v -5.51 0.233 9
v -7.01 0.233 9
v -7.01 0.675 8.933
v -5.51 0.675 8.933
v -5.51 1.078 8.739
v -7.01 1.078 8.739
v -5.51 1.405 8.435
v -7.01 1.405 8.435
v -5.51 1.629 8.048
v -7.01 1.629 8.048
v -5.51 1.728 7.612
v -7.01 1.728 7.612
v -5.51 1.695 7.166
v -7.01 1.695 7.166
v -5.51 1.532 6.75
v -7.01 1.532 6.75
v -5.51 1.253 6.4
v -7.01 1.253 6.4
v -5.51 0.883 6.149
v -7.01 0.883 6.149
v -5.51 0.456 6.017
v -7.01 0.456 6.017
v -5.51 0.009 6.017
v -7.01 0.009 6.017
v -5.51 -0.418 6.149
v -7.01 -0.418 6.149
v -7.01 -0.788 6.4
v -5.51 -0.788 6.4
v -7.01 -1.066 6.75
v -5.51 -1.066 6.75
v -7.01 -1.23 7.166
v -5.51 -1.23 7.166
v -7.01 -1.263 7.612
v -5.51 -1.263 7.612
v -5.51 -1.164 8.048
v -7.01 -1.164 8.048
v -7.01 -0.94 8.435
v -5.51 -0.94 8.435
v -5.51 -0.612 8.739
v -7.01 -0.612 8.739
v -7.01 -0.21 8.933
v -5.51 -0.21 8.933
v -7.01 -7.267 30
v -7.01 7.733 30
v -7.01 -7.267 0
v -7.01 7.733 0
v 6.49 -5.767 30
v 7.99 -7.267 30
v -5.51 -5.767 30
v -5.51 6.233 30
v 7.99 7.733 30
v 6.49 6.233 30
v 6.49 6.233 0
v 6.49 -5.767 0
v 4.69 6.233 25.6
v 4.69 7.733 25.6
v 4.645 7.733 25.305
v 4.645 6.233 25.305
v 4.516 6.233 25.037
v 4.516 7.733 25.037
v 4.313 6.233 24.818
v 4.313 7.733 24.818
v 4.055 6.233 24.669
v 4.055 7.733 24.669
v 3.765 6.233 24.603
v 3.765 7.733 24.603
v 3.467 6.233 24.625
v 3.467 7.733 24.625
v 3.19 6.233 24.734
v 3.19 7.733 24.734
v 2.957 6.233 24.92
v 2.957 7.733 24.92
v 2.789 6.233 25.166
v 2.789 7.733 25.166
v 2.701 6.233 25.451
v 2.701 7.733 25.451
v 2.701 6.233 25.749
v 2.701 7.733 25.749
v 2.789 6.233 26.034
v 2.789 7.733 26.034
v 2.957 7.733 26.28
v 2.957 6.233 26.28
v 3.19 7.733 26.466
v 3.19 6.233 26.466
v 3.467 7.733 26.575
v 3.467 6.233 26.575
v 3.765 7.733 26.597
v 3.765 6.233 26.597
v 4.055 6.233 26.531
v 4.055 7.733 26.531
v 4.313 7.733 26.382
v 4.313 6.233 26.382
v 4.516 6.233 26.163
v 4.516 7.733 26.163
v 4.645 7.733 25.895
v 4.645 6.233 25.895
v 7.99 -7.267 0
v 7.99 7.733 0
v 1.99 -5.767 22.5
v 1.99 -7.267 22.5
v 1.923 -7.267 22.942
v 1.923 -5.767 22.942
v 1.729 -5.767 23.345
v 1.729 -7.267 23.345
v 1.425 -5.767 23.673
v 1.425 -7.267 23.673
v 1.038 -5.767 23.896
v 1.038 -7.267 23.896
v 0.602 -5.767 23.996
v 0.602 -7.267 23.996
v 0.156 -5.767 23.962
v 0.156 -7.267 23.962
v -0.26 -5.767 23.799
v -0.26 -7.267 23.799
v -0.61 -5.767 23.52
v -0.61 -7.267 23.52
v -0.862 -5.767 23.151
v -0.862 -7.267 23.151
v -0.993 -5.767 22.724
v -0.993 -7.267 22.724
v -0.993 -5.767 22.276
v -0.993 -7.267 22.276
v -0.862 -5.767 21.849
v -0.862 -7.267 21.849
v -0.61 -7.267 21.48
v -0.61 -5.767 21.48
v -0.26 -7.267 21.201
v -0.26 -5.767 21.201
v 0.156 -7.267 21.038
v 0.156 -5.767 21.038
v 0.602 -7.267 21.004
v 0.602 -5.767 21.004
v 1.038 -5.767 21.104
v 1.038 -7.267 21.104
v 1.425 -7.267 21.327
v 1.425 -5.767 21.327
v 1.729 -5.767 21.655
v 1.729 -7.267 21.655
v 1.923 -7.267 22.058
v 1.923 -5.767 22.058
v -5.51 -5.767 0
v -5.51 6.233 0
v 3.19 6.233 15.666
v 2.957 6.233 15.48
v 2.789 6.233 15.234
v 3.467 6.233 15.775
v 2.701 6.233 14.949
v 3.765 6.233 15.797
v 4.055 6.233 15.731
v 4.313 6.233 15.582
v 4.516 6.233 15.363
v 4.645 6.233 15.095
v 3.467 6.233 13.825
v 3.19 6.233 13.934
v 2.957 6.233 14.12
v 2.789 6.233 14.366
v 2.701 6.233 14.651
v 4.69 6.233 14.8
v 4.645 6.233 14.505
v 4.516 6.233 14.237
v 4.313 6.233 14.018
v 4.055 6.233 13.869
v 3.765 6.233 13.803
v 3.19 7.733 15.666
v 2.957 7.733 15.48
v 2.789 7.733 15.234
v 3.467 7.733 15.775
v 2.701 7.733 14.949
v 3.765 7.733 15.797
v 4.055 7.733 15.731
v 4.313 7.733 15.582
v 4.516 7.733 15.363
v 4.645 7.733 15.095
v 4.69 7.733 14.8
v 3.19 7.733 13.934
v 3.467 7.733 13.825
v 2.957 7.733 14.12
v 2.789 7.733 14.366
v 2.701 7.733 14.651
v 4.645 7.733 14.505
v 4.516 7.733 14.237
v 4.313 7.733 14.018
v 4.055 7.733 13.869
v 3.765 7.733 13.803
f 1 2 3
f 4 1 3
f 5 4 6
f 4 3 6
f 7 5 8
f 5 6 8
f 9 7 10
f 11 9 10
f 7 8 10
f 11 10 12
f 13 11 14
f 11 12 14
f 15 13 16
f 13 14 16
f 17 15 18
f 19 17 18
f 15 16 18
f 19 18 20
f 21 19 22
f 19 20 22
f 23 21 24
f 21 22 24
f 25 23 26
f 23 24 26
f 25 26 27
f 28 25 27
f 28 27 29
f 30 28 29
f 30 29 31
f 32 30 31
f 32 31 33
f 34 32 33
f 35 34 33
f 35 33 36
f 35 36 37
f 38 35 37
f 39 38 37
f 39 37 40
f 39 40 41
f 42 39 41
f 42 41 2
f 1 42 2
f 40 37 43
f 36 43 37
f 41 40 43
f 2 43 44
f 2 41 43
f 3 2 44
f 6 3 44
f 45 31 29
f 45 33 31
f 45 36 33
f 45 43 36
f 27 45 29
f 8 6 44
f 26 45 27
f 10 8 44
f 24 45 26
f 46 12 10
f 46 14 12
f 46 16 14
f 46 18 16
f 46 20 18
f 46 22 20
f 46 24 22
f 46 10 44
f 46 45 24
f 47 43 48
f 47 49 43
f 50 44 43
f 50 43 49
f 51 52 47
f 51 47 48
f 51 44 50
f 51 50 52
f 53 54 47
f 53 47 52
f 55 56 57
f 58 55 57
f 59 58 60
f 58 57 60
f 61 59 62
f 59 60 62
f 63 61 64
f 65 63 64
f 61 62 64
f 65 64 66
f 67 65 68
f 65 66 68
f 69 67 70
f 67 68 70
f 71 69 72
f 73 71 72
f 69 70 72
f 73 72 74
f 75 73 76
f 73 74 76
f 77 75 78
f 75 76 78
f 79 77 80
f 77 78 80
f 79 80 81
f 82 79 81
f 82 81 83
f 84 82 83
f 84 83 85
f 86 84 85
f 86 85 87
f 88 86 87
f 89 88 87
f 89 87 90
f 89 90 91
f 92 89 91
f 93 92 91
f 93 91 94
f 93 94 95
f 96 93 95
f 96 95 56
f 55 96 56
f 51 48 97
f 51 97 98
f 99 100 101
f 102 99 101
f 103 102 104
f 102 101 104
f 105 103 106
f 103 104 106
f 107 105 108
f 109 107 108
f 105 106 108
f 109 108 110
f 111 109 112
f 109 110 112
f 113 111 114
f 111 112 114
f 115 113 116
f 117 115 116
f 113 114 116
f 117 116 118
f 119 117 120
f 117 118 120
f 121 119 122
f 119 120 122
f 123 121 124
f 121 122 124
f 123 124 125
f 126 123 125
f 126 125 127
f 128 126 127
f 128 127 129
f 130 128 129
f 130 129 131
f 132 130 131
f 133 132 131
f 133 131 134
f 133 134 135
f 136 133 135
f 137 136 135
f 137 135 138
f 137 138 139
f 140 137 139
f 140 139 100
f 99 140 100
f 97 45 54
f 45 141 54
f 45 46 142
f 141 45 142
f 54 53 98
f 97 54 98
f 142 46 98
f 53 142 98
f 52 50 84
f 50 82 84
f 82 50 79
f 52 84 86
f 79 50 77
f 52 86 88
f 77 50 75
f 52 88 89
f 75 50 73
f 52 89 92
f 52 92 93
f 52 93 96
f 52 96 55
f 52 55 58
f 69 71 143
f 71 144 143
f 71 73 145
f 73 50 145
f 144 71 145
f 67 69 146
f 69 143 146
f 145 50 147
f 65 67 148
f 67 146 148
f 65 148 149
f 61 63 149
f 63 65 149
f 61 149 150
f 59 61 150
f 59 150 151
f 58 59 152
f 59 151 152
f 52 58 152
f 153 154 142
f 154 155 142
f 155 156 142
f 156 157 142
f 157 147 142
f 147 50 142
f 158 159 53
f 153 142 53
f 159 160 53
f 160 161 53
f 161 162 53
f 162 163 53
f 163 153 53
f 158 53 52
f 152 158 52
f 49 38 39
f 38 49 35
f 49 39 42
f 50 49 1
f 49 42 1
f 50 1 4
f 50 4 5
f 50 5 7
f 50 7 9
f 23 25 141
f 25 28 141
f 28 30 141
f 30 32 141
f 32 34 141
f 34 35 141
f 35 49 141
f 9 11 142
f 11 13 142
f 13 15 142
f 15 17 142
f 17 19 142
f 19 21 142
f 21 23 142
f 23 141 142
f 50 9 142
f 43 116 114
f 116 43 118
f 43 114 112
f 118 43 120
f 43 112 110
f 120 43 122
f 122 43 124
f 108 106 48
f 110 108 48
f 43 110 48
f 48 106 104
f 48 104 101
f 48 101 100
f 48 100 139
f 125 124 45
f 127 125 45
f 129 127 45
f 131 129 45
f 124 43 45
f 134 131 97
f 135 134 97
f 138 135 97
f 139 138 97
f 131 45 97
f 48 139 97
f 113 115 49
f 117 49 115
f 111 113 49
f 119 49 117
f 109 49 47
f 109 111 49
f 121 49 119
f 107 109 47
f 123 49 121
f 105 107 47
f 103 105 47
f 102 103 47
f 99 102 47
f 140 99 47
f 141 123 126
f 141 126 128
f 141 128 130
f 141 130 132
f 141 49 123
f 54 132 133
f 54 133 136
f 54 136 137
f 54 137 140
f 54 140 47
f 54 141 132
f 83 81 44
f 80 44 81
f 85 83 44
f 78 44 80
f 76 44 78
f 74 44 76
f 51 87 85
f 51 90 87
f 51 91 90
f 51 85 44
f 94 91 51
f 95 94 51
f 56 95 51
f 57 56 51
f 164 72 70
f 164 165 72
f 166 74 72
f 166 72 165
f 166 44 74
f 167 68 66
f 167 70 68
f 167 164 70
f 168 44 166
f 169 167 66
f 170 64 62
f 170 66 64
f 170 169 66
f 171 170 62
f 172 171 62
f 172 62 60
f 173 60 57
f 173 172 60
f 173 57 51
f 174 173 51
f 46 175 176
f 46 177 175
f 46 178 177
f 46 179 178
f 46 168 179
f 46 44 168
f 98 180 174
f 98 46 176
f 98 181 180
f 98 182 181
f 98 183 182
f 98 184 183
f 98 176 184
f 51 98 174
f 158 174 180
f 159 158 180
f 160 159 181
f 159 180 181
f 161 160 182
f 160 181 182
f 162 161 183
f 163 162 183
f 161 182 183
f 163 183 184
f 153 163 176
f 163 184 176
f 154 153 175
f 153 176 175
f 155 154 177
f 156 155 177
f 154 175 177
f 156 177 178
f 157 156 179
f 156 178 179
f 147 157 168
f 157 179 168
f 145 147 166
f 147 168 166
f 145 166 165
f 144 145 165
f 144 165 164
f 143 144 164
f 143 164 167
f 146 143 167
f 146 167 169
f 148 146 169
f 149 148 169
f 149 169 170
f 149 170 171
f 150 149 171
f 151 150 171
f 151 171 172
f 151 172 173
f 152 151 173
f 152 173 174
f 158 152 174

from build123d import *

# Parameters (mm, degrees)
SKETCH_1_W          = 15
SKETCH_1_H          = 15
SKETCH_1_W_2        = 12
SKETCH_1_H_2        = 12
EXTRUDE_2_DEPTH     = 30
SKETCH_2_R          = 1
CUT_EXTRUDE_1_DEPTH = 10
SKETCH_3_R          = 1.5
CUT_EXTRUDE_2_DEPTH = 10
SKETCH_5_R          = 1.5
CUT_EXTRUDE_4_DEPTH = 10


with BuildPart() as part:
    # ｽｹｯﾁ1 → ﾎﾞｽ - 押し出し2 (new body)
    with BuildSketch(Plane.XY):
        with Locations((0.489915859, 0.232626086)):
            Rectangle(SKETCH_1_W, SKETCH_1_H)
        with Locations((0.489915859, 0.232626086)):
            Rectangle(SKETCH_1_W_2, SKETCH_1_H_2, mode=Mode.SUBTRACT)
    extrude(amount=EXTRUDE_2_DEPTH)

    # ｽｹｯﾁ2 → ｶｯﾄ - 押し出し1 (cut)
    with BuildSketch(Plane(origin=(0, 7.732626086, 0), x_dir=(1, 0, 0), z_dir=(0, 1, 0))):
        with Locations((3.689915859, -25.6)):
            Circle(SKETCH_2_R)
        with Locations((3.689915859, -14.8)):
            Circle(SKETCH_2_R)
    extrude(amount=-CUT_EXTRUDE_1_DEPTH, mode=Mode.SUBTRACT)

    # ｽｹｯﾁ3 → ｶｯﾄ - 押し出し2 (cut)
    with BuildSketch(Plane.ZY.offset(7.010084141)):
        with Locations((7.5, 0.232626086)):
            Circle(SKETCH_3_R)
    extrude(amount=-CUT_EXTRUDE_2_DEPTH, mode=Mode.SUBTRACT)

    # ｽｹｯﾁ5 → ｶｯﾄ - 押し出し4 (cut)
    with BuildSketch(Plane.XZ.offset(7.267373914)):
        with Locations((0.489915859, 22.5)):
            Circle(SKETCH_5_R)
    extrude(amount=-CUT_EXTRUDE_4_DEPTH, mode=Mode.SUBTRACT)


solid = part.part
